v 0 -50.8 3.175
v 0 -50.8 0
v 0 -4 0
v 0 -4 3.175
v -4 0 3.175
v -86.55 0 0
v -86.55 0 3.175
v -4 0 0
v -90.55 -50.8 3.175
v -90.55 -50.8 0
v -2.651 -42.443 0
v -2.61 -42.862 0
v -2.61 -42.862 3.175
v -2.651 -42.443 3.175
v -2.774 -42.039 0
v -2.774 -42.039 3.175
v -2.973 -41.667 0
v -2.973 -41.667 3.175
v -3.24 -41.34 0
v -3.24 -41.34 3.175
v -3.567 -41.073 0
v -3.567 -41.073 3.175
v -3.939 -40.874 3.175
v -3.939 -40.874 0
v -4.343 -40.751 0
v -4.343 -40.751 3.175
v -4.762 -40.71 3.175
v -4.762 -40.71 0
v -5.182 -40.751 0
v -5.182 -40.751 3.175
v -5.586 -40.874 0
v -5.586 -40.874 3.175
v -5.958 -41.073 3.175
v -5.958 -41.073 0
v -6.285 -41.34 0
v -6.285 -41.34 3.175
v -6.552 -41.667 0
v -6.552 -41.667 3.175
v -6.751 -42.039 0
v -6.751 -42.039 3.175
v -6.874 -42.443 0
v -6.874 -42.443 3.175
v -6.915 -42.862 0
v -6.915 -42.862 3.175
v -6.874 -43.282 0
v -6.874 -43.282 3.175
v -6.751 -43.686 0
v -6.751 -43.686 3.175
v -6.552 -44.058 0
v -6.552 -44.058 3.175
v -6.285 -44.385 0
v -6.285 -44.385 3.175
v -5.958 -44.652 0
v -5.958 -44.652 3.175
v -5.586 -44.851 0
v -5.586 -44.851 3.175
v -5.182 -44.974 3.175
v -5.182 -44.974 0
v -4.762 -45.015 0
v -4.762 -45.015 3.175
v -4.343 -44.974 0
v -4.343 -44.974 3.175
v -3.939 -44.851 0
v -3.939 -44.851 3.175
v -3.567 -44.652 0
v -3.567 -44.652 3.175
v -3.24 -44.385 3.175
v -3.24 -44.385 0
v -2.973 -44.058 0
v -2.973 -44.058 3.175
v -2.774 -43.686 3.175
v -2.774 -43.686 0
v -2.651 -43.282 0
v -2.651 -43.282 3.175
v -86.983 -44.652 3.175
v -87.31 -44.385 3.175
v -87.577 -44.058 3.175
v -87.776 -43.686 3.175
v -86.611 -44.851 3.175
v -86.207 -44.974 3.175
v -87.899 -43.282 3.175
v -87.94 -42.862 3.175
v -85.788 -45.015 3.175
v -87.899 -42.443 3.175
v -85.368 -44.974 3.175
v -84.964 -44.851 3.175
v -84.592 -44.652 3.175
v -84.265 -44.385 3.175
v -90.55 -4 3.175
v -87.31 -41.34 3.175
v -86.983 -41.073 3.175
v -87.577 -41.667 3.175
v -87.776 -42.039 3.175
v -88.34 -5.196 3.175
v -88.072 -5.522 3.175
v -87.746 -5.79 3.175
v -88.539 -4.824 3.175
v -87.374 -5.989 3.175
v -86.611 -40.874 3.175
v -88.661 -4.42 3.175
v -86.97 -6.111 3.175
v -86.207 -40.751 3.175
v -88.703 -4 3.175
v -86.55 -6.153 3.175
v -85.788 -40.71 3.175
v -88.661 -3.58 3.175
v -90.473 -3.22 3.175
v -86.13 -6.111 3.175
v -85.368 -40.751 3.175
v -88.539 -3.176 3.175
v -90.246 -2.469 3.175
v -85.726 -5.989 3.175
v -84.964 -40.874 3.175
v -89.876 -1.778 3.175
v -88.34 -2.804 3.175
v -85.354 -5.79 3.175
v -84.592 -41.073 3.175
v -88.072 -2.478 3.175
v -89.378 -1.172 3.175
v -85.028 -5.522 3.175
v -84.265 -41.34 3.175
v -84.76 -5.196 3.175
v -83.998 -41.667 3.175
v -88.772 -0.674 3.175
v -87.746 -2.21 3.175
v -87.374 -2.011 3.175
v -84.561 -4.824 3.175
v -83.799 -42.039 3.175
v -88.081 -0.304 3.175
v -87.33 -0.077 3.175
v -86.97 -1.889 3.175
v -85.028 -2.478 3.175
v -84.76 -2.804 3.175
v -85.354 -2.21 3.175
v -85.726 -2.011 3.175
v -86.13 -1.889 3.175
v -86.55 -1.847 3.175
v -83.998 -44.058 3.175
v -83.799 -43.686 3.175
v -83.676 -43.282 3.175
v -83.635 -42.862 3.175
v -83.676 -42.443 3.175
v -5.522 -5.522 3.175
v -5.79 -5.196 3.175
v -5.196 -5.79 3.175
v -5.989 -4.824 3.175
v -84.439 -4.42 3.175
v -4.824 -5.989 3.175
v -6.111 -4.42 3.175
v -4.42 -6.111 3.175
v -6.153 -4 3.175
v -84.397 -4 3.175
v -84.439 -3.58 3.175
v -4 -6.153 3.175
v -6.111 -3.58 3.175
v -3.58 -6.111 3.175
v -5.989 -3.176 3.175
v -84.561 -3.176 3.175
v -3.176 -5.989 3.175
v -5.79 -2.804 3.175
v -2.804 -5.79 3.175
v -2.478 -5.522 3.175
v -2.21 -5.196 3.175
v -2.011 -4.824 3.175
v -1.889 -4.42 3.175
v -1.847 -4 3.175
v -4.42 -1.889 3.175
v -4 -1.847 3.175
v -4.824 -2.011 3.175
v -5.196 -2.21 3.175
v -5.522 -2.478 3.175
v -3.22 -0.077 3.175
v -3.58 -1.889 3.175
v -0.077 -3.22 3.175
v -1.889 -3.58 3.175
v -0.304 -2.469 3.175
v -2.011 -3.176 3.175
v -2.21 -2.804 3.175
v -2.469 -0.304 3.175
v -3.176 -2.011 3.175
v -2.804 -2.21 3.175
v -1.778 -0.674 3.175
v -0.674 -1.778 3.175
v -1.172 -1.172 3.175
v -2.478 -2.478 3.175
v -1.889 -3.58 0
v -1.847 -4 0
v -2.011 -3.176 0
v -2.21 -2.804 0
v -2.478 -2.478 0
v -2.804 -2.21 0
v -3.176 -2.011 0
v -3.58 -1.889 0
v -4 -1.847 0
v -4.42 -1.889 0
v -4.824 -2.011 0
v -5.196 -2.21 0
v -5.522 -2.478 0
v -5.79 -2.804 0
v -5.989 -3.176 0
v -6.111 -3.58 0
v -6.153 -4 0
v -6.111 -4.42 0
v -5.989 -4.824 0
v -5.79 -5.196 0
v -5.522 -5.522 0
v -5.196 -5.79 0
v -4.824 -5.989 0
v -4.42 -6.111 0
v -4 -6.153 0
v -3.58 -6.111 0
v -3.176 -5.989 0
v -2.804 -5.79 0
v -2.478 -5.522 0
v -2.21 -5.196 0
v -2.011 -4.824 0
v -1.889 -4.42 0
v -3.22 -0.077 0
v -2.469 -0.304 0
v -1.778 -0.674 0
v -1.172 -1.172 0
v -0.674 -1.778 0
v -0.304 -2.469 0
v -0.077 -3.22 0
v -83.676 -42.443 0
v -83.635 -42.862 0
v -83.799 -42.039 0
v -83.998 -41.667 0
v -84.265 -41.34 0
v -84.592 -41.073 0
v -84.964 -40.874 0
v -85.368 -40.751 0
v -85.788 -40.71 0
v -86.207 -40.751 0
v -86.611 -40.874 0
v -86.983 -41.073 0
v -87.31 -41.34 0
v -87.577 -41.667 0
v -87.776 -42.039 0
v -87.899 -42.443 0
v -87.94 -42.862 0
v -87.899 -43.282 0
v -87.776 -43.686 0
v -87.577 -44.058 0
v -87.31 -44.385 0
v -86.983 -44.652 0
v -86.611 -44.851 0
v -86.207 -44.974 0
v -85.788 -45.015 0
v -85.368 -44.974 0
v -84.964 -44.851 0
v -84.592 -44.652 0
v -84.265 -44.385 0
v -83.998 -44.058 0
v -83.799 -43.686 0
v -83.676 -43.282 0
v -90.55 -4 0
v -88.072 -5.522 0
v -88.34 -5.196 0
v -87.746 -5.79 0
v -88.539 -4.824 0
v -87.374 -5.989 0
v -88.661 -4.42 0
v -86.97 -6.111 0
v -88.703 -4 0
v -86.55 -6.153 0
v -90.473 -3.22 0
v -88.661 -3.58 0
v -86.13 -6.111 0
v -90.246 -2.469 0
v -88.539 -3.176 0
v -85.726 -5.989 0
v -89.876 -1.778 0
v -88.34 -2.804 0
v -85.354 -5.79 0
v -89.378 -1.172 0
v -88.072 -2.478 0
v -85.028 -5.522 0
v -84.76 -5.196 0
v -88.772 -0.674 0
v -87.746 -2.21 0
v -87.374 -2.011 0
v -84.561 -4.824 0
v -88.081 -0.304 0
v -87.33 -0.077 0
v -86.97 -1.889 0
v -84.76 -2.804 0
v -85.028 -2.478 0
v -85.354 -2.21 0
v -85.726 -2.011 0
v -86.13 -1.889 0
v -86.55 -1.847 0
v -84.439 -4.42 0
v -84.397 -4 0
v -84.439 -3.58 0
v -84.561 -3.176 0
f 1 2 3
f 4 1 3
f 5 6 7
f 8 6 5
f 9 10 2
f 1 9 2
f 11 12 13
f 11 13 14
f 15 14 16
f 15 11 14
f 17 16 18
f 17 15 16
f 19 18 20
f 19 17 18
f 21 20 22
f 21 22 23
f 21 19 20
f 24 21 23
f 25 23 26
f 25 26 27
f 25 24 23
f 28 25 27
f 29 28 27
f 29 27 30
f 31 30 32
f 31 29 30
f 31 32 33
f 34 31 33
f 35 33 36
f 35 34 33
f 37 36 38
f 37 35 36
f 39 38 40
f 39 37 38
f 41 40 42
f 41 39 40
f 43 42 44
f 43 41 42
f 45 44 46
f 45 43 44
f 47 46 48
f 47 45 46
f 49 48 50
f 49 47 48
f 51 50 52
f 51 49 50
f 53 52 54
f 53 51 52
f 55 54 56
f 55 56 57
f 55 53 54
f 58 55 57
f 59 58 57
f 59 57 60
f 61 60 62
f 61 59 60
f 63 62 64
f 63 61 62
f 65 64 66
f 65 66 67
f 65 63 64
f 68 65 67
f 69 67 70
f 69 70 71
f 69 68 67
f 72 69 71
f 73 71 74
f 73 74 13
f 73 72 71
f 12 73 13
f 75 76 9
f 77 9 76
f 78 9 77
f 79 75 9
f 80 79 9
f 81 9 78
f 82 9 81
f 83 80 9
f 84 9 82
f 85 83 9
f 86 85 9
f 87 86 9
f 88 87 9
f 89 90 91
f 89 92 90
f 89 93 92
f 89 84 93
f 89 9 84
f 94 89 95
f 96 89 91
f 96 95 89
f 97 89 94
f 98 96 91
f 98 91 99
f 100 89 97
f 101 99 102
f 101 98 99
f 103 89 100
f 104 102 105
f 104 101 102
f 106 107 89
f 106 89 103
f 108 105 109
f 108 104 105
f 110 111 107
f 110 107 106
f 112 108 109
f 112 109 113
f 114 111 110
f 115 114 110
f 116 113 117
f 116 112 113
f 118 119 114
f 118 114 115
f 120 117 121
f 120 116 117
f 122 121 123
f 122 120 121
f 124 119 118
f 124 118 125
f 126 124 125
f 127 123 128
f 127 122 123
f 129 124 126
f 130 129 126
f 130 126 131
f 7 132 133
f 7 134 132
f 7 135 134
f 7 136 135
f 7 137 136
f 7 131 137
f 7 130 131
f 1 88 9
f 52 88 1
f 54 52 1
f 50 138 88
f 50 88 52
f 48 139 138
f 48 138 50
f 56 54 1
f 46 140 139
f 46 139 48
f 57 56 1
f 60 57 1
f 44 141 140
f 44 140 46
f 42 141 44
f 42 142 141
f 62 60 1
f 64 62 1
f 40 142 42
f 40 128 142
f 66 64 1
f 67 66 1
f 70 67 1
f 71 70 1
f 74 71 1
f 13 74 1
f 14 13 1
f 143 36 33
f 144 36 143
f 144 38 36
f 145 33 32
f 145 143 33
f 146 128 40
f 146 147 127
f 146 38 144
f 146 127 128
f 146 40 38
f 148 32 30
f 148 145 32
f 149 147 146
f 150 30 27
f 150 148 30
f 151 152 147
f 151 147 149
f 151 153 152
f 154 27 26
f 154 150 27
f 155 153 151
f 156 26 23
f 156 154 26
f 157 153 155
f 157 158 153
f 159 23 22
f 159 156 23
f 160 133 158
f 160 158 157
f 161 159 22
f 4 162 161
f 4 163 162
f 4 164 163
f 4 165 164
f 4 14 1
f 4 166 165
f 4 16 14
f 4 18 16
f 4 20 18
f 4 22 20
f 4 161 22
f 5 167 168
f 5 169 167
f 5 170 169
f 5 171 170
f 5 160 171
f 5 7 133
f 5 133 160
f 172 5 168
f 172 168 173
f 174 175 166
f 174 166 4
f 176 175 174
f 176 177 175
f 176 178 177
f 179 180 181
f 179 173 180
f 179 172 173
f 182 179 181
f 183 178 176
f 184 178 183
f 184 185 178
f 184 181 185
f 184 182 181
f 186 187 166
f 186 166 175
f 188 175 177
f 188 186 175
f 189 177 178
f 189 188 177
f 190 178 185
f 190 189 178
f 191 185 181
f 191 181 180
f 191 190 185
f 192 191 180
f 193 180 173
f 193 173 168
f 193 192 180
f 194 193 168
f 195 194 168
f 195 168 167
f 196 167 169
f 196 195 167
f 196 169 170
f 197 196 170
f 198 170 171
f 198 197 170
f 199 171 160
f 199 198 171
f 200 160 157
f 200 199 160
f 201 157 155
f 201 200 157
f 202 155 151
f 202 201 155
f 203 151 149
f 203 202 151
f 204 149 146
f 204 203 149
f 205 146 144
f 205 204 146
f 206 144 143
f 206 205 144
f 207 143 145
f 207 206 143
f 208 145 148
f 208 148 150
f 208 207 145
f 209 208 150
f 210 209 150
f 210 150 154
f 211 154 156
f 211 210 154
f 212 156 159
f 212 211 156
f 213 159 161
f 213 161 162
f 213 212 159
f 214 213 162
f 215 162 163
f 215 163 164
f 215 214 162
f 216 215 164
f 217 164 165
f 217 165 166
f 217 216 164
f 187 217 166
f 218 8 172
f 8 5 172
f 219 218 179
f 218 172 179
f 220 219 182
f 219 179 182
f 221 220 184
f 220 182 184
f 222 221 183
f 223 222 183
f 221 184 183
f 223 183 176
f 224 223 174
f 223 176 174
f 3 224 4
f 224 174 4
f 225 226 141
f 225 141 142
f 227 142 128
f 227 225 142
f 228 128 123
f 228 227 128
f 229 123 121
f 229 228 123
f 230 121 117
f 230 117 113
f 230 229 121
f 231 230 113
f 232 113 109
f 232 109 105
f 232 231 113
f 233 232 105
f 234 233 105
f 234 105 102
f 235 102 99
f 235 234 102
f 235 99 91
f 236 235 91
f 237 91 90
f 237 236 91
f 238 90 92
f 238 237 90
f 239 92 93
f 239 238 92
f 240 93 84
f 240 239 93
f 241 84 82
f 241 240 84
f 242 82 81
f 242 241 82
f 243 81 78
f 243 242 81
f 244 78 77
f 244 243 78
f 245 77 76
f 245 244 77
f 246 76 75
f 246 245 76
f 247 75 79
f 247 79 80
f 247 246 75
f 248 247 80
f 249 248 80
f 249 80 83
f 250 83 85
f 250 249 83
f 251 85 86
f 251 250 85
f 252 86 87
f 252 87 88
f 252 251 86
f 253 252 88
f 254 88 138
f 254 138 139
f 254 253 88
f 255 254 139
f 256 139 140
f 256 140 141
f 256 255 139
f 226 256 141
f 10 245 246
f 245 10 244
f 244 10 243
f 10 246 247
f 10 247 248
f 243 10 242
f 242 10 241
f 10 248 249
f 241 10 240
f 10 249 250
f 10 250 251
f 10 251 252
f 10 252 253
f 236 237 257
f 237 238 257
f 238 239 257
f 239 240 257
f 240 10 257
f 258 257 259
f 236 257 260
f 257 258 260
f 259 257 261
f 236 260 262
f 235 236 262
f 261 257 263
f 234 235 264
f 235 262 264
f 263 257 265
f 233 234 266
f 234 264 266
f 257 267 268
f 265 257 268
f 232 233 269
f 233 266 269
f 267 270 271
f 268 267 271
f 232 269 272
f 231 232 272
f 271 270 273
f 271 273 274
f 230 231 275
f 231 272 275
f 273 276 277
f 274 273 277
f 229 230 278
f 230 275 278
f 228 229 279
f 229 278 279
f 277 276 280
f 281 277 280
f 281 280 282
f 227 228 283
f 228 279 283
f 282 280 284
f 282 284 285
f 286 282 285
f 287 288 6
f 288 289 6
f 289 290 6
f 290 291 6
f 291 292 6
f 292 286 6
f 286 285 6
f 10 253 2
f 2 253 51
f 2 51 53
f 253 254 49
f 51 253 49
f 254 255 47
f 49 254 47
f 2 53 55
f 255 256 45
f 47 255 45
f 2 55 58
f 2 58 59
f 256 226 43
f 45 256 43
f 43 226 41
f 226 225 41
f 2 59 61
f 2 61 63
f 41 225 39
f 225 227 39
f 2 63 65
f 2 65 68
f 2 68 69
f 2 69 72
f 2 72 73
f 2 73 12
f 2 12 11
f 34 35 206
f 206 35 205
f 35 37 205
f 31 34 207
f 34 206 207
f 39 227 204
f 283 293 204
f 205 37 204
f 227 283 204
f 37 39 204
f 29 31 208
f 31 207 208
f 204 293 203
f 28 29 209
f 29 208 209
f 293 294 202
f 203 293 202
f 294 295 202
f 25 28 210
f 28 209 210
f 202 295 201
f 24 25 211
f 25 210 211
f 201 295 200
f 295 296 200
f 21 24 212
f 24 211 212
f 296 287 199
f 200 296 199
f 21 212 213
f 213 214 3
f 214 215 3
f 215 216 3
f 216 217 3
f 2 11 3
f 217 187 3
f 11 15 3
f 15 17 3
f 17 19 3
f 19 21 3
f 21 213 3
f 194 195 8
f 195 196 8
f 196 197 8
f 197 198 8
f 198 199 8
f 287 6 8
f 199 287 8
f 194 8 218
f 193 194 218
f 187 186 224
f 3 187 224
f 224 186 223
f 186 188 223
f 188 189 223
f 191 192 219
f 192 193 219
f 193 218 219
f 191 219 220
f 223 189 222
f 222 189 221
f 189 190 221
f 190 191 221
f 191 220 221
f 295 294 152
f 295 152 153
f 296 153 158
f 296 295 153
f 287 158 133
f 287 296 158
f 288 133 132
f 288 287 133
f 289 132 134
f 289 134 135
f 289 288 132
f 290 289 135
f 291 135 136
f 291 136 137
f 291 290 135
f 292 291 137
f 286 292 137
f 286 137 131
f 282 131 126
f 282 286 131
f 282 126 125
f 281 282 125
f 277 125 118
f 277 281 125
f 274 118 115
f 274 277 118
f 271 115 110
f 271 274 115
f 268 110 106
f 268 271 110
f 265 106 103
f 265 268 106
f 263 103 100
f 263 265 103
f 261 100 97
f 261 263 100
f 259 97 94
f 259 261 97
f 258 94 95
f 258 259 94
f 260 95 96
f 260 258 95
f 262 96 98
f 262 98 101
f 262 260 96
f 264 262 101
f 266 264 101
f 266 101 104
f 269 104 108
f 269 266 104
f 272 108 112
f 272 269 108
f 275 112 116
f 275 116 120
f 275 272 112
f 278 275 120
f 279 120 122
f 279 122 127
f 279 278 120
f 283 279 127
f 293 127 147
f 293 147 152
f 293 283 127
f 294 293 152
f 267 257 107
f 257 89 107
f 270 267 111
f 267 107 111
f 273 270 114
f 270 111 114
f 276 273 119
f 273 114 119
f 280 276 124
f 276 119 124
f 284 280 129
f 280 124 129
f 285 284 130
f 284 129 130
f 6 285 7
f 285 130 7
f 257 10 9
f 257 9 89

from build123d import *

# Parameters (mm, degrees)
F0_W     = 90.55
F0_H     = 50.8
F0_R     = 2.15265
F1_DEPTH = 3.175
F2_R     = 4


with BuildPart() as f1:
    # F0 (on Top) → F1 (new body)
    with BuildSketch(Plane.XY):
        with Locations((-45.275, -25.4)):
            Rectangle(F0_W, F0_H)
        with Locations((-85.7875, -42.8625)):
            Circle(F0_R, mode=Mode.SUBTRACT)
        with Locations((-4.7625, -42.8625)):
            Circle(F0_R, mode=Mode.SUBTRACT)
        with Locations((-86.55, -4)):
            Circle(F0_R, mode=Mode.SUBTRACT)
        with Locations((-4, -4)):
            Circle(F0_R, mode=Mode.SUBTRACT)
    extrude(amount=F1_DEPTH)

    # F2
    f2_edges = [f1.edges().sort_by_distance(p)[0] for p in [
        (0, 0, 1.5875),
        (-90.55, 0, 1.5875),
    ]]
    fillet(f2_edges, radius=F2_R)


solid = f1.part
